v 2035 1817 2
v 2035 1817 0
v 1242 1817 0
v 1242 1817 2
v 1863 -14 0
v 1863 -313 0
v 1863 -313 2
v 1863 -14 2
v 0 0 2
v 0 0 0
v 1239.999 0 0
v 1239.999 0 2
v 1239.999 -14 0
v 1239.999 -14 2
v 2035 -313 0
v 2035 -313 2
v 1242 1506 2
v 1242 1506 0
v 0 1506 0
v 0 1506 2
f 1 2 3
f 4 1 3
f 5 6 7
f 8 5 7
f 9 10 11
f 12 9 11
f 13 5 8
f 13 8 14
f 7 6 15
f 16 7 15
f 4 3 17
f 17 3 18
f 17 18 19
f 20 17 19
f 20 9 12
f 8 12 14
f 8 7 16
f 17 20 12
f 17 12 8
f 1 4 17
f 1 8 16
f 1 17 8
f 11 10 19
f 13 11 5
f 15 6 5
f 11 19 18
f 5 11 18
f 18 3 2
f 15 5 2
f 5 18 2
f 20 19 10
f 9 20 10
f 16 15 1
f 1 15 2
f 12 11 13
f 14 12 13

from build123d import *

# Parameters (mm, degrees)
BOSS_EXTRUDE1_DEPTH = 2
CUT_EXTRUDE2_DEPTH  = 330


with BuildPart() as part:
    # Sketch1 → Boss-Extrude1 (new body)
    with BuildSketch(Plane.XY):
        Polygon((1242, 1506), (0, 1506), (0, 0), (1239.998813056, 0), (1239.998813056, -14), (1672.998813056, -14), (1672.998813056, -313), (2035, -313), (2035, 1817), (1242, 1817), align=None)
    extrude(amount=BOSS_EXTRUDE1_DEPTH)

    # Sketch3 → Cut-Extrude2 (cut)
    with BuildSketch(Plane(origin=(-124.112118138, -344, 1006.457487155), x_dir=(-1, 0, 0), z_dir=(0, -1, 0))):
        with BuildLine():
            Line((-1887.112118138, 819.457487155), (-1466.112118138, 819.457487155))
            ThreePointArc((-1466.112118138, 819.457487155), (-1395.40144002, 848.746809036), (-1366.112118138, 919.457487155))
            Line((-1366.112118138, 919.457487155), (-1366.112118138, 2569.457487155))
            ThreePointArc((-1366.112118138, 2569.457487155), (-1395.40144002, 2640.168165273), (-1466.112118138, 2669.457487155))
            Line((-1466.112118138, 2669.457487155), (-1887.112118138, 2669.457487155))
            ThreePointArc((-1887.112118138, 2669.457487155), (-1957.822796257, 2640.168165273), (-1987.112118138, 2569.457487155))
            Line((-1987.112118138, 2569.457487155), (-1987.112118138, 919.457487155))
            ThreePointArc((-1987.112118138, 919.457487155), (-1957.822796257, 848.746809036), (-1887.112118138, 819.457487155))
        make_face()
    extrude(amount=-CUT_EXTRUDE2_DEPTH, mode=Mode.SUBTRACT)


solid = part.part
